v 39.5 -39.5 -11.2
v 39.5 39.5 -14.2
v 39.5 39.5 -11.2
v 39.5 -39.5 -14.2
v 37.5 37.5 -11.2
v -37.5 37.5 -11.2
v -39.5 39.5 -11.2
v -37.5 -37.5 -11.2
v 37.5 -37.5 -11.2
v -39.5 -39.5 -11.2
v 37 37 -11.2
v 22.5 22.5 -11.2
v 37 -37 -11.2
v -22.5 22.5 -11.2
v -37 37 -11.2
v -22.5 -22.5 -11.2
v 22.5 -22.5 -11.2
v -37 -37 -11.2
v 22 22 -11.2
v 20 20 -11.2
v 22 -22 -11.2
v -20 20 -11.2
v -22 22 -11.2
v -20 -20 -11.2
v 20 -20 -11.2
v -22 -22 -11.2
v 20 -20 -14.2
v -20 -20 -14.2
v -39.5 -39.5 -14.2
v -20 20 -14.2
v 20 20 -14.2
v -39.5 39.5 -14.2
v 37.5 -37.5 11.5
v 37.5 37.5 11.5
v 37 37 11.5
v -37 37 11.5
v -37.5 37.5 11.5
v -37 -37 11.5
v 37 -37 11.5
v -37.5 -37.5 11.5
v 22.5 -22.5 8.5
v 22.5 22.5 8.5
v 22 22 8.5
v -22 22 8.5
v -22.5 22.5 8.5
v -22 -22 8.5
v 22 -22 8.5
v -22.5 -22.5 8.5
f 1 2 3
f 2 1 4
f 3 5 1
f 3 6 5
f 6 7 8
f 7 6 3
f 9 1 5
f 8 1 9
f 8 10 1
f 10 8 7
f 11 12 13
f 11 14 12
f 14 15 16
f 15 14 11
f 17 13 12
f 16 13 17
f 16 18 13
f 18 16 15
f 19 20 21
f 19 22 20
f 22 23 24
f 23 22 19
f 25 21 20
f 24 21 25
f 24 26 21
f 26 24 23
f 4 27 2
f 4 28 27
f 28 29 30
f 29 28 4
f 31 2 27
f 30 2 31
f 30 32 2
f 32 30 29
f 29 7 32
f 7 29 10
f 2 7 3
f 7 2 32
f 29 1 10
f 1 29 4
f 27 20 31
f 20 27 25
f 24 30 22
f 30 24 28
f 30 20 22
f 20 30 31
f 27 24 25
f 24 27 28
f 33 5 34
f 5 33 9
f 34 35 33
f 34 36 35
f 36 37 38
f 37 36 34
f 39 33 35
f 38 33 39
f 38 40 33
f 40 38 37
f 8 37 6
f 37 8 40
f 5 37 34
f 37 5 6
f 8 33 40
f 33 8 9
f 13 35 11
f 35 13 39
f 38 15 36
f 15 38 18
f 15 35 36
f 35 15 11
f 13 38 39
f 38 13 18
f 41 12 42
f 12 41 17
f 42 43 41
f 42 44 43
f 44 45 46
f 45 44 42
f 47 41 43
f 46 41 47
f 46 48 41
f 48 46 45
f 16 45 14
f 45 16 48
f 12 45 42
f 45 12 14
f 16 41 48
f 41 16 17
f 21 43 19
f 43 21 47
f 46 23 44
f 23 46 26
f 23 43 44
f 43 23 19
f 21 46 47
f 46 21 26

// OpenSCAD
// Copyright (c) 2013, 2014 by Jean-Louis Paquelin (jlp6k).
// This work is licensed under the Creative Commons Attribution
// Partage dans les Mêmes Conditions 3.0 France License.
// To view a copy of this license, visit http://creativecommons.org/licenses/by-sa/3.0/fr/
// CC-BY-SA

// Created 2013-11-29
// Last modified 2014-02-15

// dimensions are set in millimeters

Has_Inner_Cutter = "yes"; // [yes:Output will have an inner cutter, no: simple cookie cutter]

Cutter_Thickness = 0.5;

Outer_Side = 75;
Outer_Height = 23;

Inner_Side_Difference = 15;
Inner_Height_Difference = 3;

Frame_Thickness = 3;
Frame_Flange = 2;

union() {
    // grip / frame
    translate([0, 0, -(Outer_Height / 2) - (Frame_Thickness / 2) + (Frame_Thickness / 10)])
        difference() {
            cube([Outer_Side + Frame_Flange * 2, 
                  Outer_Side + Frame_Flange * 2,
                  Frame_Thickness],
                  center = true);

            if(Has_Inner_Cutter == "yes") {
                cube([Outer_Side - Inner_Side_Difference * 2 - Cutter_Thickness * 2 - Frame_Flange * 2, 
                      Outer_Side - Inner_Side_Difference * 2 - Cutter_Thickness * 2 - Frame_Flange * 2,
                      Frame_Thickness + 1],
                      center = true);
            } else {
                cube([Outer_Side - Cutter_Thickness * 2 - Frame_Flange * 2, 
                      Outer_Side - Cutter_Thickness * 2 - Frame_Flange * 2,
                      Frame_Thickness + 1],
                      center = true);
                
            }
        }

    // outer cutter
    difference() {
        cube([Outer_Side,
              Outer_Side, 
              Outer_Height],
              center = true);
        cube([Outer_Side - Cutter_Thickness * 2,
              Outer_Side - Cutter_Thickness * 2,
              Outer_Height + 10],
              center = true);
    }


    if(Has_Inner_Cutter == "yes") {
        // inner cutter
        translate([0, 0,  -Inner_Height_Difference / 2])
            difference() {
                cube([Outer_Side - Inner_Side_Difference * 2,
                      Outer_Side - Inner_Side_Difference * 2,
                      Outer_Height - Inner_Height_Difference],
                      center = true);
                cube([Outer_Side - Inner_Side_Difference * 2 - Cutter_Thickness * 2,
                      Outer_Side - Inner_Side_Difference * 2 - Cutter_Thickness * 2,
                      Outer_Height - Inner_Height_Difference + 10],
                      center = true);
            }
    }
}
